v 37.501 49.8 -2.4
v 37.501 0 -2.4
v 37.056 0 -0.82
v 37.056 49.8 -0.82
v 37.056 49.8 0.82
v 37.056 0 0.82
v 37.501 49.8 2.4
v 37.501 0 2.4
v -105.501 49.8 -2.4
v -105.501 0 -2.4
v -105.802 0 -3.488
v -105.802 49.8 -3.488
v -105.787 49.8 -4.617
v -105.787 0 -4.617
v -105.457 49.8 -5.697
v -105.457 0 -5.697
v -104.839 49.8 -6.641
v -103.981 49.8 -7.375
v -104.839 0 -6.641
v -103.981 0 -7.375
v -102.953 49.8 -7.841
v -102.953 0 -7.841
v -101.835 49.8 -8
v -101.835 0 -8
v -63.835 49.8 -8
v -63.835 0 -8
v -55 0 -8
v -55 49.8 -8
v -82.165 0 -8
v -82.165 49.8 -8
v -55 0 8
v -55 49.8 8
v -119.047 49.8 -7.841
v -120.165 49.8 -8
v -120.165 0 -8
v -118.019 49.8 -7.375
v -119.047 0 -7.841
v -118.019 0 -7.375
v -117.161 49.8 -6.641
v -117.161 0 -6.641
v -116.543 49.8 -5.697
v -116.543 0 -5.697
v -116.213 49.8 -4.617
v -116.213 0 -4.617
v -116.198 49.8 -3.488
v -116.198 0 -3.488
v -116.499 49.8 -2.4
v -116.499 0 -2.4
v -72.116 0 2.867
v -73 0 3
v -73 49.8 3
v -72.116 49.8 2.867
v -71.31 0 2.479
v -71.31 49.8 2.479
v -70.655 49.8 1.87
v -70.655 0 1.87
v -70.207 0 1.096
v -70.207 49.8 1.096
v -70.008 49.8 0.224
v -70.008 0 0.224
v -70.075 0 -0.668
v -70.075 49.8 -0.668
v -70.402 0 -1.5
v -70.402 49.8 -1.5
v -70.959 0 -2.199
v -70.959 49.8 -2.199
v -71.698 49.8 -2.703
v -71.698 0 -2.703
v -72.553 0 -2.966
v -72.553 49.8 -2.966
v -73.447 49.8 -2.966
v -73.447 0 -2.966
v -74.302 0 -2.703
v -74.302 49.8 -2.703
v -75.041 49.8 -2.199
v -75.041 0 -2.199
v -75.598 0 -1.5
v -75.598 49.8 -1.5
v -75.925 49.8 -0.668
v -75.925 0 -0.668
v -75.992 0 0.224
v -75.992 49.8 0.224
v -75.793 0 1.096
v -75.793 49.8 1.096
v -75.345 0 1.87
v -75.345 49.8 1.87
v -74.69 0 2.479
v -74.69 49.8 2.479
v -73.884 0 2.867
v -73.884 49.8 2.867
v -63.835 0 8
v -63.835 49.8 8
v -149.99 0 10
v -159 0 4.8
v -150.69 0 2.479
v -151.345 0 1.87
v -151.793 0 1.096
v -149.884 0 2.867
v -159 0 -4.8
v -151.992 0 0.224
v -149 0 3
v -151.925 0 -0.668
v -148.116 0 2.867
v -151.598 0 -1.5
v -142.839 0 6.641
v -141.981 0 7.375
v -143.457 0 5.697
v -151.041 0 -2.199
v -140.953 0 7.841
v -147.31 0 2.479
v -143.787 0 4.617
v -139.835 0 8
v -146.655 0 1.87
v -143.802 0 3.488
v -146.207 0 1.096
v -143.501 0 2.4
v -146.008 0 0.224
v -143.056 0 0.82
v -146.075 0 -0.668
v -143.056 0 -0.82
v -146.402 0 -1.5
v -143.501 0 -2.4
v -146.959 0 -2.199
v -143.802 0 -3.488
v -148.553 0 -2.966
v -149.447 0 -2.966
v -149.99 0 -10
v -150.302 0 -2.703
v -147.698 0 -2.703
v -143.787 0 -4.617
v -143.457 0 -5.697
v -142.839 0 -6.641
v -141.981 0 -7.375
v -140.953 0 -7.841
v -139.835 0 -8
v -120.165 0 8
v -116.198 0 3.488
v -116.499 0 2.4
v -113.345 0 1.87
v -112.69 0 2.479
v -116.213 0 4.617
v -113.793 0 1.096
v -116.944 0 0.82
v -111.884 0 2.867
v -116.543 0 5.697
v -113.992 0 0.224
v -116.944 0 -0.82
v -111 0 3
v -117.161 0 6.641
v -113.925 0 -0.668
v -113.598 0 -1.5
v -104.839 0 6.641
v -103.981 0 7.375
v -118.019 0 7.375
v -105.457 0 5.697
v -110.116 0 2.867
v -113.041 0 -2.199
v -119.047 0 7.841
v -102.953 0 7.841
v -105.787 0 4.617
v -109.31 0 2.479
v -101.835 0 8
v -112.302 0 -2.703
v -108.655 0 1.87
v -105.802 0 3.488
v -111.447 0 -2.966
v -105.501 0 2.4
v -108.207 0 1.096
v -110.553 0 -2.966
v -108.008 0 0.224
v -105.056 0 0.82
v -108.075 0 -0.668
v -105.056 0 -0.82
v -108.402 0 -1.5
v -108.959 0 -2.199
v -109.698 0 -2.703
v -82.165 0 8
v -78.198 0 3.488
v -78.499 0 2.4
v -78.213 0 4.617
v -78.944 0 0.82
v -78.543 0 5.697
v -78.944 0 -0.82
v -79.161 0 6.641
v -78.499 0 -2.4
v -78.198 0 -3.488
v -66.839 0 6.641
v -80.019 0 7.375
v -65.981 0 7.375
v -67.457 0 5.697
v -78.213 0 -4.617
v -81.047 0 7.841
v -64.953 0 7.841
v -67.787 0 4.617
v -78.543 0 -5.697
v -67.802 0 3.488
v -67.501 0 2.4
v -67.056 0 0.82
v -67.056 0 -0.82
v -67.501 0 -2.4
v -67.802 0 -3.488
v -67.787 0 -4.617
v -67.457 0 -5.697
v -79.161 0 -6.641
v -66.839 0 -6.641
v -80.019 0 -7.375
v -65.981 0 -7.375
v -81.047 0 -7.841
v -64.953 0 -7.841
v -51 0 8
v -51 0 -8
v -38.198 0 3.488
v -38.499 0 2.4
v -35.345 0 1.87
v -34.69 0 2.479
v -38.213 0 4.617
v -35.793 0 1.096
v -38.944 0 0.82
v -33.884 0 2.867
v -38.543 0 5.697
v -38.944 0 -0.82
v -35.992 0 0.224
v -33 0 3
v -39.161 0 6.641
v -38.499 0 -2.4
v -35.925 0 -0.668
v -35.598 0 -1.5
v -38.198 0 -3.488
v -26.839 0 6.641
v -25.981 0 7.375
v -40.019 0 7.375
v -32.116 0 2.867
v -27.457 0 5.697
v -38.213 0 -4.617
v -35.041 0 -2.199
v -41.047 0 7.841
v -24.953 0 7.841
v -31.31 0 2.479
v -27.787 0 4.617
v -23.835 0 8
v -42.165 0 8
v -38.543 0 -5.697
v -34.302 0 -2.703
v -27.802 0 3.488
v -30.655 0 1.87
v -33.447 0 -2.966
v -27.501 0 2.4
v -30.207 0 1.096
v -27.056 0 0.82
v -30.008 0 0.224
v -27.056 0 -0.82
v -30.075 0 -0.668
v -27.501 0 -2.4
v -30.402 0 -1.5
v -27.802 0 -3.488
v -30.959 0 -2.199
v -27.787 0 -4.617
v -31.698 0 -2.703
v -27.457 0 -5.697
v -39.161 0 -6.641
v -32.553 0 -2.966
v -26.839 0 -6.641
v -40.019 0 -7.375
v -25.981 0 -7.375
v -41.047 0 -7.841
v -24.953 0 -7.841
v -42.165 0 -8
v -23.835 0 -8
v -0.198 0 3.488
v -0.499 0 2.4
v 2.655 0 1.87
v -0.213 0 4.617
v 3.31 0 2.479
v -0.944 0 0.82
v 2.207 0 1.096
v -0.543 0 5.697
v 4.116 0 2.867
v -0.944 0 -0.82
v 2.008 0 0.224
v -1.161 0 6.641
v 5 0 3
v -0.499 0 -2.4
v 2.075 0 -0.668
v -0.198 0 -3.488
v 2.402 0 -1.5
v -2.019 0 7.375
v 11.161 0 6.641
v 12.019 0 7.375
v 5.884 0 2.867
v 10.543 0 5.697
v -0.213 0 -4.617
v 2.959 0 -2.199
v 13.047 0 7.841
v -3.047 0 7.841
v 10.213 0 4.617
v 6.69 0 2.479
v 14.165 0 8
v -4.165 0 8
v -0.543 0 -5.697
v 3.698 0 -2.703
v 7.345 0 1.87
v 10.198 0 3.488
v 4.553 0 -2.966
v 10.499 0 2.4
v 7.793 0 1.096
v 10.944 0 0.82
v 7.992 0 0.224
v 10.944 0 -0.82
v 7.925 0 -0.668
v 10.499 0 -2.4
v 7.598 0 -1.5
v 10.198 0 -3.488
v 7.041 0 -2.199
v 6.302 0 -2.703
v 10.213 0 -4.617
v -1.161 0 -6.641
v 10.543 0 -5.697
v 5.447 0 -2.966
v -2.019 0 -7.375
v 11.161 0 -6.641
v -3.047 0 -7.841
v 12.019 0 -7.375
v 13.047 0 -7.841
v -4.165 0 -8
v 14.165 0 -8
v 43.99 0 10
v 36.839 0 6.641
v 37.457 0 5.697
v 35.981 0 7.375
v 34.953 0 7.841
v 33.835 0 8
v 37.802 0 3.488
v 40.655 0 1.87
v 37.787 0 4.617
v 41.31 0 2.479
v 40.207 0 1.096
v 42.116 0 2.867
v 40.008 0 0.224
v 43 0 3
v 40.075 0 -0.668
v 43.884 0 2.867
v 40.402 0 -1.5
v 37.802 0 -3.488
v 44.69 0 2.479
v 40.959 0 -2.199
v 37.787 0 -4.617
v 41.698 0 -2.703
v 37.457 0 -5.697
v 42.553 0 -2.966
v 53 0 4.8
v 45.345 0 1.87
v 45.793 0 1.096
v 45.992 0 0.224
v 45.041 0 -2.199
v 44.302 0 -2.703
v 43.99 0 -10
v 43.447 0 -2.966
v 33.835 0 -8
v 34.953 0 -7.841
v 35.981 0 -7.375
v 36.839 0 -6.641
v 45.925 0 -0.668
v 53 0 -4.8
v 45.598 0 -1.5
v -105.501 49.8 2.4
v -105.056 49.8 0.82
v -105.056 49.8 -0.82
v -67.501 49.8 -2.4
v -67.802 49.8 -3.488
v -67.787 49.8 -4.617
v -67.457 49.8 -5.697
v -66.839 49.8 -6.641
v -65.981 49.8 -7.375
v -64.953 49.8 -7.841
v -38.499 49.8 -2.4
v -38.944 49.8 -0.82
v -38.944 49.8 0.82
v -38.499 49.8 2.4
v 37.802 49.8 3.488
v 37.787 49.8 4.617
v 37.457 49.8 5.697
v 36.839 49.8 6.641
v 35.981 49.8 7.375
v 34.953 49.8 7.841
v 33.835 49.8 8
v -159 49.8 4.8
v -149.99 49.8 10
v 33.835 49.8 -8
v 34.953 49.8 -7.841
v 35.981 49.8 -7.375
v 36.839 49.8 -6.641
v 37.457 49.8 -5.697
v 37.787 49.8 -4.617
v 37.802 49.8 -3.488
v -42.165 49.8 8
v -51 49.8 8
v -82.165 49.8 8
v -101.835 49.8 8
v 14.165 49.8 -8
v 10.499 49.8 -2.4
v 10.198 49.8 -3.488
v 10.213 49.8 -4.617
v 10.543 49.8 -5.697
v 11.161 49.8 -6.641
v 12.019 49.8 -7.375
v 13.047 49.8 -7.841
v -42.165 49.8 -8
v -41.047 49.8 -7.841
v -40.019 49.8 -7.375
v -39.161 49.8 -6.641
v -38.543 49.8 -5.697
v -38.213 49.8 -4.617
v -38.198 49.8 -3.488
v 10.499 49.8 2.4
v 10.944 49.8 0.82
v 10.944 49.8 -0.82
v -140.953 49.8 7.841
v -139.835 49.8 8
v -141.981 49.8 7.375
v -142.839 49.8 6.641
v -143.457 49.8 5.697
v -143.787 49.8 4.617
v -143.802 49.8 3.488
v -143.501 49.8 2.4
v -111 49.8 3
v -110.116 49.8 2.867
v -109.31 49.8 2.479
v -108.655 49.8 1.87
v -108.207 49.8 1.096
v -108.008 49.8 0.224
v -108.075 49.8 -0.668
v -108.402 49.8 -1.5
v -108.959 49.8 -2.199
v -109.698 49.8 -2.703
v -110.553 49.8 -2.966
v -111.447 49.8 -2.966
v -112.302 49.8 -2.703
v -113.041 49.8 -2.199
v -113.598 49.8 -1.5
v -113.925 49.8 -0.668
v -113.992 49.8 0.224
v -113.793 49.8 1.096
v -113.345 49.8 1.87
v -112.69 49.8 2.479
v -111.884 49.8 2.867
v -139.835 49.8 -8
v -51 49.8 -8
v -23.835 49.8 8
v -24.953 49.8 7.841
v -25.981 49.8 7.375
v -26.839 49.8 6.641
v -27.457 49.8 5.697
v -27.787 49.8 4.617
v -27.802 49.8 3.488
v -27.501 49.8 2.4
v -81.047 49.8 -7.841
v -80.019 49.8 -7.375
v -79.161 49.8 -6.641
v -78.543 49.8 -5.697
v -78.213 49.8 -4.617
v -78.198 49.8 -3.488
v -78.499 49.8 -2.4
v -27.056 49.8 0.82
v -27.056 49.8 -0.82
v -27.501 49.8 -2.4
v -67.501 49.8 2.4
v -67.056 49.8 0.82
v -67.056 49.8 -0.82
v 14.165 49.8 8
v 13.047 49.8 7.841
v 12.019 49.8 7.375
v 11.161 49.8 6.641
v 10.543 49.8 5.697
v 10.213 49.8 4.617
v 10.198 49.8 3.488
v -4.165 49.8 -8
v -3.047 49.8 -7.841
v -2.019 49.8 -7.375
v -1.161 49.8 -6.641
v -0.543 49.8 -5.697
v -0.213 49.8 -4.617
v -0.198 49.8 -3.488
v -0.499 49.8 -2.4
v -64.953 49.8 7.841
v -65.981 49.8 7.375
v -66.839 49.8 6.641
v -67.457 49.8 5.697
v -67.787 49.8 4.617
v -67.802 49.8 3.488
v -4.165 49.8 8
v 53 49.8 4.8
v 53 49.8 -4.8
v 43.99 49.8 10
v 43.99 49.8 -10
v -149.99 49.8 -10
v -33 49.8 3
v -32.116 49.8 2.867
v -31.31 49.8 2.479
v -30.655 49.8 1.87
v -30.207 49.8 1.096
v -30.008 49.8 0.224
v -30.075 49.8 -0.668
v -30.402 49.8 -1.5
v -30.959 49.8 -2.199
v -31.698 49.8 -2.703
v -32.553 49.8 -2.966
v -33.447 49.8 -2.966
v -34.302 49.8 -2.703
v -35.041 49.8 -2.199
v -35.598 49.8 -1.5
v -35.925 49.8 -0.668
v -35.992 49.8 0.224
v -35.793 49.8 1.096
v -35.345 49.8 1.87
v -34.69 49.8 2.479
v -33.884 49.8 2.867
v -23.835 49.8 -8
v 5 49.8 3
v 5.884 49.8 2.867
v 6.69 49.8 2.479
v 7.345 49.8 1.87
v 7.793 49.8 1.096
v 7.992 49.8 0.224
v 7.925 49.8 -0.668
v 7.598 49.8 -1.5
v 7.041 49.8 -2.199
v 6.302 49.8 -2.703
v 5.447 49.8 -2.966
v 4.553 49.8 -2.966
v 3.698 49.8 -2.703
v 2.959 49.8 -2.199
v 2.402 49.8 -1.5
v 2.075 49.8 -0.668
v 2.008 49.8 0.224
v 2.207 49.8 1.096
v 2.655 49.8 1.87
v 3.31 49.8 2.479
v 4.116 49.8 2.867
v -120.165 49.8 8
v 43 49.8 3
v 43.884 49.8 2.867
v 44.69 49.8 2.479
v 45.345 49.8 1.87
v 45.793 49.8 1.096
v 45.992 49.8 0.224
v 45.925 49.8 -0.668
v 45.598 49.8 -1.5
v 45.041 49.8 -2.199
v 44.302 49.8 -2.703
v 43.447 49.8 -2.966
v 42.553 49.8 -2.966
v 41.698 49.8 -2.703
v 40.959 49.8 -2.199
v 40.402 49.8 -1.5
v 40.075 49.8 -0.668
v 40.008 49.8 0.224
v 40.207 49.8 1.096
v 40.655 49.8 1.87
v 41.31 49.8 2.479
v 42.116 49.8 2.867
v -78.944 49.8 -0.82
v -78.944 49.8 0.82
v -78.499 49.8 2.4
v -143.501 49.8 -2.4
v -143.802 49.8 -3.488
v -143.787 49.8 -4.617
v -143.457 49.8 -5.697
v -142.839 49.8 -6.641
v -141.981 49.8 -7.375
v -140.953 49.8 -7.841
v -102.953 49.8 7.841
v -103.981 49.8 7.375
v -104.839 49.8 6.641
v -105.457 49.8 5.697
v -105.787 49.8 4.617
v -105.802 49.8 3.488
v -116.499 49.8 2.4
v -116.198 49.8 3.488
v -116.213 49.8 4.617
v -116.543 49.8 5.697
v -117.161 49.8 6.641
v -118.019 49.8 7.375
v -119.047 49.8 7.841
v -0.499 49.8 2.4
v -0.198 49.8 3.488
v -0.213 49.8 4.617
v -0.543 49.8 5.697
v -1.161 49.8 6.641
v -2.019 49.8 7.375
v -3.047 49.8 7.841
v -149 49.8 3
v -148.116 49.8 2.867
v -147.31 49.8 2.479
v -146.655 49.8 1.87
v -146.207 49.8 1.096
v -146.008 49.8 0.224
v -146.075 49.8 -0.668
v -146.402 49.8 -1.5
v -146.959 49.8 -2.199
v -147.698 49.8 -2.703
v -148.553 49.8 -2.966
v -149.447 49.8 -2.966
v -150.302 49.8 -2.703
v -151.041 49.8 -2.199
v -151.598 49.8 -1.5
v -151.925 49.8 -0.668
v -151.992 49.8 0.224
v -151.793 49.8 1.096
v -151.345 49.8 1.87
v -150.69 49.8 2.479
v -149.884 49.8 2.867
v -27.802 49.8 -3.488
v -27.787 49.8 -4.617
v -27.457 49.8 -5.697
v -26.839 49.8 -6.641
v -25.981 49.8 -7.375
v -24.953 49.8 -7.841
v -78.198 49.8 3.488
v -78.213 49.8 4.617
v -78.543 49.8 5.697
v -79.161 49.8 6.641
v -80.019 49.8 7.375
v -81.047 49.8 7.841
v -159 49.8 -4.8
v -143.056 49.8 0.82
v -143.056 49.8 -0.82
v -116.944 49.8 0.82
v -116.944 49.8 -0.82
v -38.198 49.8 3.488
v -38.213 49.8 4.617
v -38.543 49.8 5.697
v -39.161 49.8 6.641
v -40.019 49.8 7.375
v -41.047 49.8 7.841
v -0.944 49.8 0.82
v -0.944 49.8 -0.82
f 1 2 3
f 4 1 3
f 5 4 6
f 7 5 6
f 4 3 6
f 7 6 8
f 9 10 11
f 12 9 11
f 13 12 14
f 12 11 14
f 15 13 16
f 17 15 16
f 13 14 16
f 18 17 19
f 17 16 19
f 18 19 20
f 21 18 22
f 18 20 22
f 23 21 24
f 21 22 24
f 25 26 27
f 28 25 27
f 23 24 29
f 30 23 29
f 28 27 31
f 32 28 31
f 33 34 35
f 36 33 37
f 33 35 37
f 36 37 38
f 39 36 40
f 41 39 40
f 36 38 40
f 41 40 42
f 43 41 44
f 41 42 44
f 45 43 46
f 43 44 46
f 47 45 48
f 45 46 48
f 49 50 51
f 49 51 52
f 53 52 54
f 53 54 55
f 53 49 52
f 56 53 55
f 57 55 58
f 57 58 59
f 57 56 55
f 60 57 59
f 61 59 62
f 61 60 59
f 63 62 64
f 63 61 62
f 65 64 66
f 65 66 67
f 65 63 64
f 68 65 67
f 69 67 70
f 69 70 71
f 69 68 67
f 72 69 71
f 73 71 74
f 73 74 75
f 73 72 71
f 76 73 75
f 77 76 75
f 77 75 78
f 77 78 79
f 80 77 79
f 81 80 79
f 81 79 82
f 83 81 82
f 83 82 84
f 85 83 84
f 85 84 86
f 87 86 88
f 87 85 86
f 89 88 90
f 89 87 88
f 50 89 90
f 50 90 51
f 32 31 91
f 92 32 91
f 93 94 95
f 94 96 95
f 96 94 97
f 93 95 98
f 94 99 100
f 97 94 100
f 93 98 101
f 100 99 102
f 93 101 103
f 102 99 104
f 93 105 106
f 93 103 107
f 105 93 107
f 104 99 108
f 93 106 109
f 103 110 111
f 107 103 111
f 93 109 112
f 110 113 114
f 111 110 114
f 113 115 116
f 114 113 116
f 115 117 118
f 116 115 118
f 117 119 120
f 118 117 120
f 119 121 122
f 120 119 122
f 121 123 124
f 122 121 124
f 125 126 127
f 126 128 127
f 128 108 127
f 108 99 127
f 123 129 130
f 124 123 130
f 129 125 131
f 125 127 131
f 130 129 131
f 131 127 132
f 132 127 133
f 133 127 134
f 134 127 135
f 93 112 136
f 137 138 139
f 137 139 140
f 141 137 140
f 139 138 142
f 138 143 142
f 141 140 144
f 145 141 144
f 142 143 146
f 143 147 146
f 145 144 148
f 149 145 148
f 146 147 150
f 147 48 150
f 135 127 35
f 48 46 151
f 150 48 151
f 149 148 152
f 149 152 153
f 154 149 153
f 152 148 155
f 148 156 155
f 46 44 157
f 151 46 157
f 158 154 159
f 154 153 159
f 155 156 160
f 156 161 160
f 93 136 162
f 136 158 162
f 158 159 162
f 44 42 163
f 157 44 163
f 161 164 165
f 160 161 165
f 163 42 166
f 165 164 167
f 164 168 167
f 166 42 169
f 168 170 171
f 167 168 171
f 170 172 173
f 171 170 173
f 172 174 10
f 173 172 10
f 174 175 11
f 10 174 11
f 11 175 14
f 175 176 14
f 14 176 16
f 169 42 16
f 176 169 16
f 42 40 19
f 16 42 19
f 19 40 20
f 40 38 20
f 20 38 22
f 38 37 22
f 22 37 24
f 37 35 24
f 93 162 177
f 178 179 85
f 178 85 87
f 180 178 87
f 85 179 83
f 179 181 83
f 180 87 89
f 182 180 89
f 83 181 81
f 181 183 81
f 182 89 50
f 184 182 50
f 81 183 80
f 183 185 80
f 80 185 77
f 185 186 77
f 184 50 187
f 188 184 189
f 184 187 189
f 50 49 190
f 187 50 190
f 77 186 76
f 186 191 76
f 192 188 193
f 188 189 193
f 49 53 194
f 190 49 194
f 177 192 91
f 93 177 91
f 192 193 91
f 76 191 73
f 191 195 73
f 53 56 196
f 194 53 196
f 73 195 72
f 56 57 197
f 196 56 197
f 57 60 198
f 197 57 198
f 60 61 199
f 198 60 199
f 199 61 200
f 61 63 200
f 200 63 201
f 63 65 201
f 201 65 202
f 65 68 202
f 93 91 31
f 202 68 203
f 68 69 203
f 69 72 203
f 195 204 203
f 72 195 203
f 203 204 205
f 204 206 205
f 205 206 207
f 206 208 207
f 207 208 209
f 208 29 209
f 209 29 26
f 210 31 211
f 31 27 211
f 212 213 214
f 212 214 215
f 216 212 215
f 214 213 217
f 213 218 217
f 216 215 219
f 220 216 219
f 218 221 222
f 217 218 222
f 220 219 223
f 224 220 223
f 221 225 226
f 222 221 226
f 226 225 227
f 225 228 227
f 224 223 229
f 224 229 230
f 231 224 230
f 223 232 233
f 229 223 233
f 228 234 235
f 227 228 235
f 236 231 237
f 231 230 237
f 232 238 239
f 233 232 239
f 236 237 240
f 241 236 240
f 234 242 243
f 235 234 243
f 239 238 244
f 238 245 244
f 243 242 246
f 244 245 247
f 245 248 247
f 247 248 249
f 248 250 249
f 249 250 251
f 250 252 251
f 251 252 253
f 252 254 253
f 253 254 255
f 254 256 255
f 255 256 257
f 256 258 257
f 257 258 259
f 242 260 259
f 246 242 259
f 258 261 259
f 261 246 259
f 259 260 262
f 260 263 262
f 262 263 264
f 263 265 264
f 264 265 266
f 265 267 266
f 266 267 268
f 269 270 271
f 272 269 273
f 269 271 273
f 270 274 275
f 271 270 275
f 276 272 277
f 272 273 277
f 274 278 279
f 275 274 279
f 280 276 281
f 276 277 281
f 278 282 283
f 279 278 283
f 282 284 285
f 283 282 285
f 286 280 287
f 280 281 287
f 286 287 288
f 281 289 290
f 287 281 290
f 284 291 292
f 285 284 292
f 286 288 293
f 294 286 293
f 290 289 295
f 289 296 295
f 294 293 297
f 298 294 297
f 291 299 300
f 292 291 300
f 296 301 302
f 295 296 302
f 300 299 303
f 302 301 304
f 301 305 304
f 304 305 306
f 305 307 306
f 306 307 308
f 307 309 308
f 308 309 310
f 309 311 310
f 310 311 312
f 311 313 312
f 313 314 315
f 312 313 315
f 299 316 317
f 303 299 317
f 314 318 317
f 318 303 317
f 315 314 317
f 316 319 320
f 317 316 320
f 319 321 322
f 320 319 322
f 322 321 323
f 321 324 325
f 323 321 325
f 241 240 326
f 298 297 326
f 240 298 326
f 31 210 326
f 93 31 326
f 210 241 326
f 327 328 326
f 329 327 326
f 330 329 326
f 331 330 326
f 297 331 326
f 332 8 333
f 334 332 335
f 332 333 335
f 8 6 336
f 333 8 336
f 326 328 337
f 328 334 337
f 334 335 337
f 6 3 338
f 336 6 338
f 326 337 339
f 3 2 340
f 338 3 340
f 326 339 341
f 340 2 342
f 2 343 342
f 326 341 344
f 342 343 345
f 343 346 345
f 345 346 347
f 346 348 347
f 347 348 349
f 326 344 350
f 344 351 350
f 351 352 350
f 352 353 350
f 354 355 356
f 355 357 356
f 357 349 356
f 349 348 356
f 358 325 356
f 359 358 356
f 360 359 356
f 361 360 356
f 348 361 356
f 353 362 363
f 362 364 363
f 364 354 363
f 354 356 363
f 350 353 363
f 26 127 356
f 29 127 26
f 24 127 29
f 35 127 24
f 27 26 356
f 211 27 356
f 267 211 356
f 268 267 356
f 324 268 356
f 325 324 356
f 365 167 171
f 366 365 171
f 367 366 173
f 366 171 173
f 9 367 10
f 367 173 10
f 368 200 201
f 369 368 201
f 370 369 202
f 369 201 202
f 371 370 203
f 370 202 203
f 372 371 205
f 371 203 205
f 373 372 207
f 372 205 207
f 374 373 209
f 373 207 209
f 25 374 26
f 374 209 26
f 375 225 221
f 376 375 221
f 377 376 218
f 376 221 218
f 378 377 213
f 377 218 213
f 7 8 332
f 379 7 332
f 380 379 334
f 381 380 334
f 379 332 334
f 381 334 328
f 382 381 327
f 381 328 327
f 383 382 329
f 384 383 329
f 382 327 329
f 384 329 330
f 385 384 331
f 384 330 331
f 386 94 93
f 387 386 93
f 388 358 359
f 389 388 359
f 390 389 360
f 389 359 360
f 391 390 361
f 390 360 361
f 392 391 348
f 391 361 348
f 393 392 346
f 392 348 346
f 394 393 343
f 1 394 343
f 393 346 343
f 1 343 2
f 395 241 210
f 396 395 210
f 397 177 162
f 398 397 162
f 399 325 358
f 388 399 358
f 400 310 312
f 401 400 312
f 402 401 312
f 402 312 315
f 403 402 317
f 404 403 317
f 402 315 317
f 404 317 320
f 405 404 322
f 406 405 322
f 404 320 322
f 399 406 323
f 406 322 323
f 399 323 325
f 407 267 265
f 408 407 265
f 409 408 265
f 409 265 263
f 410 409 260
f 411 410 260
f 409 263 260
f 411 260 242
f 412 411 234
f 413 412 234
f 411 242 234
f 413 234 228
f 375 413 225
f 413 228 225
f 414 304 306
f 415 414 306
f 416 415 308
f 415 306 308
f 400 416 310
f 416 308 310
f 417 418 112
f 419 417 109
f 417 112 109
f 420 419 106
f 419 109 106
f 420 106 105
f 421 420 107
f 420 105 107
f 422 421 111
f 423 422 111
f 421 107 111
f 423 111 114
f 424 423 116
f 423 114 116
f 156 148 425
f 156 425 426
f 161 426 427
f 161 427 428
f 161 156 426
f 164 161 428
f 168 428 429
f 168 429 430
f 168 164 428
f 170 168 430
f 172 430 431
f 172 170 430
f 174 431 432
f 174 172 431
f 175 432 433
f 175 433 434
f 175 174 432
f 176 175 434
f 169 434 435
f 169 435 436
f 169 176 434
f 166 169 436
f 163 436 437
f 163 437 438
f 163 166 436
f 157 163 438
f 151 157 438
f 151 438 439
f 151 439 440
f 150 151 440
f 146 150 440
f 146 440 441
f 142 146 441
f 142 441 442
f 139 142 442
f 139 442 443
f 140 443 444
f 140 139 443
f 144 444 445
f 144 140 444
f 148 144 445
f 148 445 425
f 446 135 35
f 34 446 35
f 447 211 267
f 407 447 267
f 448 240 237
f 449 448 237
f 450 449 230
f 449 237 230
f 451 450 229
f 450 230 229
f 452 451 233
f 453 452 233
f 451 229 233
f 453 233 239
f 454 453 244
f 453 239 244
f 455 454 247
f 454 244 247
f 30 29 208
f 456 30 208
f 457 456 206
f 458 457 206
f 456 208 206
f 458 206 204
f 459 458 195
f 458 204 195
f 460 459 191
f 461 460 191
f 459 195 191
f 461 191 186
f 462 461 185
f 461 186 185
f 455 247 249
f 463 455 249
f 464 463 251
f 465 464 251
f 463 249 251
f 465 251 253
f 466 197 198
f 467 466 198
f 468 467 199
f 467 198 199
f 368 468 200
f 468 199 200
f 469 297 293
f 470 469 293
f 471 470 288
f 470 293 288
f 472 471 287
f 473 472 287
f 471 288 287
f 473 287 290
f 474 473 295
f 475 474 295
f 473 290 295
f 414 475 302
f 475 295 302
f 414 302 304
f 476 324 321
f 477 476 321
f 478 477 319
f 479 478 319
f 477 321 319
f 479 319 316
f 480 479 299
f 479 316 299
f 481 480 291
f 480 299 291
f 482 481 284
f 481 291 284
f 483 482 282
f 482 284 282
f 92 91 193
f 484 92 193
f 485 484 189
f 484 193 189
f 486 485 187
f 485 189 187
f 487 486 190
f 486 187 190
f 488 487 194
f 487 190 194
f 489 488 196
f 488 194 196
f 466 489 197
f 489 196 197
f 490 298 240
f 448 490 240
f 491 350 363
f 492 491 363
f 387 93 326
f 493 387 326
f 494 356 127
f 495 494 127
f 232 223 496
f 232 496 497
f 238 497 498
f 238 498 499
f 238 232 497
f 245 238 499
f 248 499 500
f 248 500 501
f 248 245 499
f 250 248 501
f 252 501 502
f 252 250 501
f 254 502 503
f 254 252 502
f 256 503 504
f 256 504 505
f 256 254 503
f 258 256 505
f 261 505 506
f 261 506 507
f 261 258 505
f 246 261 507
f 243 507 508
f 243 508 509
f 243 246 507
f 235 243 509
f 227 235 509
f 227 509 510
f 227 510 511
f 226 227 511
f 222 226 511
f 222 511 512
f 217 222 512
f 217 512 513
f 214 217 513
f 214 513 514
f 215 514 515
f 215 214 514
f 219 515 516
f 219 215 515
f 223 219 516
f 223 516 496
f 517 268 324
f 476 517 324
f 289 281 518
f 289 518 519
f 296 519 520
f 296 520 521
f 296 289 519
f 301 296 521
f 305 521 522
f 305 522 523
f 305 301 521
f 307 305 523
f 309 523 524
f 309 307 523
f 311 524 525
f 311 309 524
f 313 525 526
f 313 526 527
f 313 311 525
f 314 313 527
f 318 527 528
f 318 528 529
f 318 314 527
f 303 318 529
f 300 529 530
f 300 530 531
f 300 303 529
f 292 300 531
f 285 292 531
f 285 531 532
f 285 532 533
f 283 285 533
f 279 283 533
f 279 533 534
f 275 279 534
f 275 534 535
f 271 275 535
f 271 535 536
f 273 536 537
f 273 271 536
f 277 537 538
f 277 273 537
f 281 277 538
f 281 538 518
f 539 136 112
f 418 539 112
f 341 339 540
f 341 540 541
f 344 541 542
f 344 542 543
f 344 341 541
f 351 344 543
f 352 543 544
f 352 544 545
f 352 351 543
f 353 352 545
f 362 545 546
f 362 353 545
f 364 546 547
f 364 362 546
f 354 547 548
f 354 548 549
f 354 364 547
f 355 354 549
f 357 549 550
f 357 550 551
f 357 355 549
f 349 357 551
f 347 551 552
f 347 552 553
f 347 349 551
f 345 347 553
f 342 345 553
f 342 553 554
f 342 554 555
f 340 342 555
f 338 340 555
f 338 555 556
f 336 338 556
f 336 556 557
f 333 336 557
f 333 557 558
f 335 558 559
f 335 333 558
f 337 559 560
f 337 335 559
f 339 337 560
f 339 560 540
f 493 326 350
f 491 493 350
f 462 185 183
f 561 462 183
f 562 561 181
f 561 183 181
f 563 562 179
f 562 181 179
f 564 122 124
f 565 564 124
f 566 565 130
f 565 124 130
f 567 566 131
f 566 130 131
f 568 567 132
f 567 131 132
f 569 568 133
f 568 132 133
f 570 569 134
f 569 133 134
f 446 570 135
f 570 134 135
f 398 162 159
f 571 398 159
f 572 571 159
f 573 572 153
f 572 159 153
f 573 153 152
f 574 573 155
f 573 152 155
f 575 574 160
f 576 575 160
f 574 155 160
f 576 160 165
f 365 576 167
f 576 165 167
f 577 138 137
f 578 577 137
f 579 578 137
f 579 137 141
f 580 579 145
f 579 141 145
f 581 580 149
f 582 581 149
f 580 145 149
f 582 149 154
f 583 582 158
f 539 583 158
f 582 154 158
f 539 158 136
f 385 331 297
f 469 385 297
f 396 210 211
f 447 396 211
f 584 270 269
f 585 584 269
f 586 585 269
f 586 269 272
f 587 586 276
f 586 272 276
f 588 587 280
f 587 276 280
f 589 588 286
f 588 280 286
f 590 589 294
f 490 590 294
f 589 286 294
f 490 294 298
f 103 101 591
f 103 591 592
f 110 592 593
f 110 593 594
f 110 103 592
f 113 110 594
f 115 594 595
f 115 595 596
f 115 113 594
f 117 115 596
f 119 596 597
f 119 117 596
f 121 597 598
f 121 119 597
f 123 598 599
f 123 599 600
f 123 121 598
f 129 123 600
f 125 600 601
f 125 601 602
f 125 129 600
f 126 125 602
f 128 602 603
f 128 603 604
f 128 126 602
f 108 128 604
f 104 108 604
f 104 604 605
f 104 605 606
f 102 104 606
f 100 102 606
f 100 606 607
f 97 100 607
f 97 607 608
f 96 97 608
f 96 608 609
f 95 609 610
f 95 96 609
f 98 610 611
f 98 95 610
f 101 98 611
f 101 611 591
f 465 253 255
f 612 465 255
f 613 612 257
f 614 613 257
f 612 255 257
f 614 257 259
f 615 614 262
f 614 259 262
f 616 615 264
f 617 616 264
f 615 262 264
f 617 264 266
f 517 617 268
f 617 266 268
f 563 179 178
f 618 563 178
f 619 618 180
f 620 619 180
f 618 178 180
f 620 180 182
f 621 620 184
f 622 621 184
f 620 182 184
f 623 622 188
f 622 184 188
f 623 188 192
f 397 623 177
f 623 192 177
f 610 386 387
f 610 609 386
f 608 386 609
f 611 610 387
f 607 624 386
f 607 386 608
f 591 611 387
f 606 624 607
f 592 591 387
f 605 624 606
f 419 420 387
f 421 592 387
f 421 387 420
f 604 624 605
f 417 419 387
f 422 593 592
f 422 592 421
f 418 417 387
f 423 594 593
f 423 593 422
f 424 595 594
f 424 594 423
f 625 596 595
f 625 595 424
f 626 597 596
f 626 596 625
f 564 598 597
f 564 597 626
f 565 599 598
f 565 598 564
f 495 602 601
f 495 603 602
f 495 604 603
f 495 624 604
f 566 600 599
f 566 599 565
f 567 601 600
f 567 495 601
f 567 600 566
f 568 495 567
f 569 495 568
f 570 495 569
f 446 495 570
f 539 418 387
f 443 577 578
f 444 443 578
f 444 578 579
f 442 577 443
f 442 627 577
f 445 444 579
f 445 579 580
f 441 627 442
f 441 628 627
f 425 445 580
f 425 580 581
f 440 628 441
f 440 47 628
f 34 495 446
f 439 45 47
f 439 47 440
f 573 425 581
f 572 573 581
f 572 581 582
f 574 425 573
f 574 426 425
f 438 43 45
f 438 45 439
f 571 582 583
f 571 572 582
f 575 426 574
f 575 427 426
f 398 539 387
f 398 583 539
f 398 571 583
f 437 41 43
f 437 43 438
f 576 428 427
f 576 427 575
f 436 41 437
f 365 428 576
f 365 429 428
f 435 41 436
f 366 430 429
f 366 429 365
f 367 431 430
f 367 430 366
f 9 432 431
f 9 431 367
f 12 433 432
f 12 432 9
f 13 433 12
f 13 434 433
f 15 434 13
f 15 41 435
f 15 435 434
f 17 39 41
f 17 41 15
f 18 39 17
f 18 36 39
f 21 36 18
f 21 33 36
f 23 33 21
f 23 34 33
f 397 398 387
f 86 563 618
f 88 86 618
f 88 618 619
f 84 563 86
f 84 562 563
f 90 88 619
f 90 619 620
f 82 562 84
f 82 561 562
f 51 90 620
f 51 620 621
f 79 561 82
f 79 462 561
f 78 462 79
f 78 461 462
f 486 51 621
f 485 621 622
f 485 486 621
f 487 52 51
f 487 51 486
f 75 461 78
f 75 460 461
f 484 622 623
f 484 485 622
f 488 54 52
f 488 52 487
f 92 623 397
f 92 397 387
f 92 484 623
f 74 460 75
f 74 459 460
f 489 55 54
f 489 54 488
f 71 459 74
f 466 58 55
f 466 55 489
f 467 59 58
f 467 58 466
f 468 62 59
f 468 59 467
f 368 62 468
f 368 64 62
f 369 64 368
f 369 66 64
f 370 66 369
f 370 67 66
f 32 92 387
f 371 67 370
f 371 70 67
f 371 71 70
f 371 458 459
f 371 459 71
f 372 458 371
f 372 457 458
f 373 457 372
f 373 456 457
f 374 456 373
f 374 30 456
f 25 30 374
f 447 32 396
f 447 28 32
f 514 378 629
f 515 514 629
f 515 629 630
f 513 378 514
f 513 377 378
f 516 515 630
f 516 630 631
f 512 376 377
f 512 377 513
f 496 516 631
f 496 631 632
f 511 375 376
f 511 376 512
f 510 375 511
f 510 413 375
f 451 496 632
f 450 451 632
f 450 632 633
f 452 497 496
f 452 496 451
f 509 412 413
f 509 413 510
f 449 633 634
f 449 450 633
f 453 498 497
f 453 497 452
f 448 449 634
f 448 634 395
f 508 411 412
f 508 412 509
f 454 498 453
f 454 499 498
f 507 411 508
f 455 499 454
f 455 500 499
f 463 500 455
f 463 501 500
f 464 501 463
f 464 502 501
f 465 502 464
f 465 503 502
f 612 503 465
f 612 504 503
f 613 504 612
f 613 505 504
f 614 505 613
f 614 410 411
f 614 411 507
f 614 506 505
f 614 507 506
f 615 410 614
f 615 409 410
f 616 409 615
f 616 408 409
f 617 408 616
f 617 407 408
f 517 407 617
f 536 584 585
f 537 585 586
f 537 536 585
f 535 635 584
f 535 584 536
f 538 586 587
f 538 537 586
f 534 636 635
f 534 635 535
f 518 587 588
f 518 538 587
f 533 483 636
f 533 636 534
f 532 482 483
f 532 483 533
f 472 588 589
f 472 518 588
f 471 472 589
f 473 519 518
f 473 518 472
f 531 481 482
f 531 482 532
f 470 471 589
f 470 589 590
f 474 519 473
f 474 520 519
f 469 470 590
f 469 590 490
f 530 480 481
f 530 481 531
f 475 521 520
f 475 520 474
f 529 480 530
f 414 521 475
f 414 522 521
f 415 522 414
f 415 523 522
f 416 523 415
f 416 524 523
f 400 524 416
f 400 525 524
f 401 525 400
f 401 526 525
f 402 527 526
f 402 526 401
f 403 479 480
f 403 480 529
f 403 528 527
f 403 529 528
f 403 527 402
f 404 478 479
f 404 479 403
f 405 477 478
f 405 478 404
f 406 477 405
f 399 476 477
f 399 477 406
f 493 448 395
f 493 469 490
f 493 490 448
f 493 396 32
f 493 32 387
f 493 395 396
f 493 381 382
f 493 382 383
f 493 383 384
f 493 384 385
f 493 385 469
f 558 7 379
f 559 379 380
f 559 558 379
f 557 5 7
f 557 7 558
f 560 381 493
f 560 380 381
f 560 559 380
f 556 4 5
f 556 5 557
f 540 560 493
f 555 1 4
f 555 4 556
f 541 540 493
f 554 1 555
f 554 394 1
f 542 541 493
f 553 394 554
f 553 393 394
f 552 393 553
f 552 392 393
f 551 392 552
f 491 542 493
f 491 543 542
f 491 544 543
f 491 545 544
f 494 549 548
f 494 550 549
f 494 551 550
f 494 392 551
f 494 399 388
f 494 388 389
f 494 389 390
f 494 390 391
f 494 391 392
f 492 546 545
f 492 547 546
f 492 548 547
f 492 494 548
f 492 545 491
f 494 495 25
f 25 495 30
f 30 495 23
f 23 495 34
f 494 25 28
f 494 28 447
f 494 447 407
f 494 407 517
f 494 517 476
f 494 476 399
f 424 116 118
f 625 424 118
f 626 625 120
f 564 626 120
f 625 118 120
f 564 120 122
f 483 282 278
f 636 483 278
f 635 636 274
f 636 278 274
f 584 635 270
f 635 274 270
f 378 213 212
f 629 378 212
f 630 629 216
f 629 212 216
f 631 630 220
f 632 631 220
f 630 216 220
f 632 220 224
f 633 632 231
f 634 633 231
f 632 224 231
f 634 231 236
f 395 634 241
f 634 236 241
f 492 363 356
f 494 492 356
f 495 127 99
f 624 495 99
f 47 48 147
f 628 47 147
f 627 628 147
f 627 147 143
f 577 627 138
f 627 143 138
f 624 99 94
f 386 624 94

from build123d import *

# Parameters (mm, degrees)
SKETCH1_R           = 3
BOSS_EXTRUDE1_DEPTH = 49.8


with BuildPart() as part:
    # Sketch1 → Boss-Extrude1 (new body)
    with BuildSketch(Plane(origin=(0, 0, 0), x_dir=(1, 0, 0), z_dir=(0, 1, 0))):
        Polygon((-149.99, -10), (43.99, -10), (53, -4.8), (53, 4.8), (43.99, 10), (-149.99, 10), (-159, 4.8), (-159, -4.8), align=None)
        with BuildLine():
            ThreePointArc((33.8348486, 8), (37.1814887, 6.190890255), (37.500909186, 2.400000045))
            ThreePointArc((37.500909186, 2.400000045), (37, 1e-09), (37.500909185, -2.400000042))
            ThreePointArc((37.500909185, -2.400000042), (37.181488707, -6.190890243), (33.834848625, -8))
            Line((33.834848625, -8), (14.165151315, -8))
            ThreePointArc((14.165151315, -8), (10.818511261, -6.190890195), (10.499090838, -2.399999991))
            ThreePointArc((10.499090838, -2.399999991), (11, -3e-09), (10.49909084, 2.399999985))
            ThreePointArc((10.49909084, 2.399999985), (10.81851128, 6.190890224), (14.165151391, 8))
            Line((14.165151391, 8), (33.8348486, 8))
        make_face(mode=Mode.SUBTRACT)
        with BuildLine():
            ThreePointArc((-0.499090895, 2.39999986), (-1, 1.1e-08), (-0.499090904, -2.399999839))
            ThreePointArc((-0.499090904, -2.399999839), (-0.818511236, -6.190890157), (-4.16515139, -8))
            Line((-4.16515139, -8), (-23.83484861, -8))
            ThreePointArc((-23.83484861, -8), (-27.181488692, -6.190890267), (-27.500909202, -2.400000081))
            ThreePointArc((-27.500909202, -2.400000081), (-27, -3.4e-08), (-27.500909174, 2.400000019))
            ThreePointArc((-27.500909174, 2.400000019), (-27.181488711, 6.190890238), (-23.83484861, 8))
            Line((-23.83484861, 8), (-4.165151415, 8))
            ThreePointArc((-4.165151415, 8), (-0.818511249, 6.190890177), (-0.499090895, 2.39999986))
        make_face(mode=Mode.SUBTRACT)
        with BuildLine():
            ThreePointArc((-38.499090754, -2.400000183), (-38.818511346, -6.190890325), (-42.165151417, -8))
            Line((-42.165151417, -8), (-51, -8))
            Line((-51, -8), (-51, 8))
            Line((-51, 8), (-42.165151363, 8))
            ThreePointArc((-42.165151363, 8), (-38.818511221, 6.190890134), (-38.499090914, 2.399999815))
            ThreePointArc((-38.499090914, 2.399999815), (-39, -2e-07), (-38.499090754, -2.400000183))
        make_face(mode=Mode.SUBTRACT)
        with BuildLine():
            Line((-55, 8), (-55, -8))
            Line((-55, -8), (-63.834848637, -8))
            ThreePointArc((-63.834848637, -8), (-67.181488771, -6.190890146), (-67.500909096, -2.39999984))
            ThreePointArc((-67.500909096, -2.39999984), (-67, 9e-08), (-67.500909168, 2.400000005))
            ThreePointArc((-67.500909168, 2.400000005), (-67.181488707, 6.190890244), (-63.834848583, 8))
            Line((-63.834848583, 8), (-55, 8))
        make_face(mode=Mode.SUBTRACT)
        with BuildLine():
            ThreePointArc((-78.499090904, 2.39999984), (-79, -1.79e-07), (-78.49909076, -2.400000169))
            ThreePointArc((-78.49909076, -2.400000169), (-78.818511334, -6.190890307), (-82.16515139, -8))
            Line((-82.16515139, -8), (-101.83484861, -8))
            ThreePointArc((-101.83484861, -8), (-105.181488717, -6.190890228), (-105.500909164, -2.399999996))
            ThreePointArc((-105.500909164, -2.399999996), (-105, 1.3e-08), (-105.500909175, 2.40000002))
            ThreePointArc((-105.500909175, 2.40000002), (-105.18148871, 6.190890239), (-101.83484861, 8))
            Line((-101.83484861, 8), (-82.16515139, 8))
            ThreePointArc((-82.16515139, 8), (-78.818511236, 6.190890157), (-78.499090904, 2.39999984))
        make_face(mode=Mode.SUBTRACT)
        with BuildLine():
            ThreePointArc((-116.499090787, 2.400000107), (-117, 5.5e-08), (-116.499090832, -2.400000005))
            ThreePointArc((-116.499090832, -2.400000005), (-116.818511285, -6.190890232), (-120.16515139, -8))
            Line((-120.16515139, -8), (-139.83484861, -8))
            ThreePointArc((-139.83484861, -8), (-143.181488722, -6.190890221), (-143.500909157, -2.39999998))
            ThreePointArc((-143.500909157, -2.39999998), (-143, 1.5e-08), (-143.500909169, 2.400000007))
            ThreePointArc((-143.500909169, 2.400000007), (-143.181488714, 6.190890233), (-139.83484861, 8))
            Line((-139.83484861, 8), (-120.16515139, 8))
            ThreePointArc((-120.16515139, 8), (-116.818511316, 6.190890279), (-116.499090787, 2.400000107))
        make_face(mode=Mode.SUBTRACT)
        with Locations(Location((-149, 0, 0), (0, 0, 270))):
            Circle(SKETCH1_R, mode=Mode.SUBTRACT)
        with Locations(Location((-73, 0, 0), (0, 0, 270))):
            Circle(SKETCH1_R, mode=Mode.SUBTRACT)
        with Locations(Location((-111, 0, 0), (0, 0, 270))):
            Circle(SKETCH1_R, mode=Mode.SUBTRACT)
        with Locations(Location((-33, 0, 0), (0, 0, 270))):
            Circle(SKETCH1_R, mode=Mode.SUBTRACT)
        with Locations(Location((5, 0, 0), (0, 0, 270))):
            Circle(SKETCH1_R, mode=Mode.SUBTRACT)
        with Locations(Location((43, 0, 0), (0, 0, 270))):
            Circle(SKETCH1_R, mode=Mode.SUBTRACT)
    extrude(amount=BOSS_EXTRUDE1_DEPTH)


solid = part.part
